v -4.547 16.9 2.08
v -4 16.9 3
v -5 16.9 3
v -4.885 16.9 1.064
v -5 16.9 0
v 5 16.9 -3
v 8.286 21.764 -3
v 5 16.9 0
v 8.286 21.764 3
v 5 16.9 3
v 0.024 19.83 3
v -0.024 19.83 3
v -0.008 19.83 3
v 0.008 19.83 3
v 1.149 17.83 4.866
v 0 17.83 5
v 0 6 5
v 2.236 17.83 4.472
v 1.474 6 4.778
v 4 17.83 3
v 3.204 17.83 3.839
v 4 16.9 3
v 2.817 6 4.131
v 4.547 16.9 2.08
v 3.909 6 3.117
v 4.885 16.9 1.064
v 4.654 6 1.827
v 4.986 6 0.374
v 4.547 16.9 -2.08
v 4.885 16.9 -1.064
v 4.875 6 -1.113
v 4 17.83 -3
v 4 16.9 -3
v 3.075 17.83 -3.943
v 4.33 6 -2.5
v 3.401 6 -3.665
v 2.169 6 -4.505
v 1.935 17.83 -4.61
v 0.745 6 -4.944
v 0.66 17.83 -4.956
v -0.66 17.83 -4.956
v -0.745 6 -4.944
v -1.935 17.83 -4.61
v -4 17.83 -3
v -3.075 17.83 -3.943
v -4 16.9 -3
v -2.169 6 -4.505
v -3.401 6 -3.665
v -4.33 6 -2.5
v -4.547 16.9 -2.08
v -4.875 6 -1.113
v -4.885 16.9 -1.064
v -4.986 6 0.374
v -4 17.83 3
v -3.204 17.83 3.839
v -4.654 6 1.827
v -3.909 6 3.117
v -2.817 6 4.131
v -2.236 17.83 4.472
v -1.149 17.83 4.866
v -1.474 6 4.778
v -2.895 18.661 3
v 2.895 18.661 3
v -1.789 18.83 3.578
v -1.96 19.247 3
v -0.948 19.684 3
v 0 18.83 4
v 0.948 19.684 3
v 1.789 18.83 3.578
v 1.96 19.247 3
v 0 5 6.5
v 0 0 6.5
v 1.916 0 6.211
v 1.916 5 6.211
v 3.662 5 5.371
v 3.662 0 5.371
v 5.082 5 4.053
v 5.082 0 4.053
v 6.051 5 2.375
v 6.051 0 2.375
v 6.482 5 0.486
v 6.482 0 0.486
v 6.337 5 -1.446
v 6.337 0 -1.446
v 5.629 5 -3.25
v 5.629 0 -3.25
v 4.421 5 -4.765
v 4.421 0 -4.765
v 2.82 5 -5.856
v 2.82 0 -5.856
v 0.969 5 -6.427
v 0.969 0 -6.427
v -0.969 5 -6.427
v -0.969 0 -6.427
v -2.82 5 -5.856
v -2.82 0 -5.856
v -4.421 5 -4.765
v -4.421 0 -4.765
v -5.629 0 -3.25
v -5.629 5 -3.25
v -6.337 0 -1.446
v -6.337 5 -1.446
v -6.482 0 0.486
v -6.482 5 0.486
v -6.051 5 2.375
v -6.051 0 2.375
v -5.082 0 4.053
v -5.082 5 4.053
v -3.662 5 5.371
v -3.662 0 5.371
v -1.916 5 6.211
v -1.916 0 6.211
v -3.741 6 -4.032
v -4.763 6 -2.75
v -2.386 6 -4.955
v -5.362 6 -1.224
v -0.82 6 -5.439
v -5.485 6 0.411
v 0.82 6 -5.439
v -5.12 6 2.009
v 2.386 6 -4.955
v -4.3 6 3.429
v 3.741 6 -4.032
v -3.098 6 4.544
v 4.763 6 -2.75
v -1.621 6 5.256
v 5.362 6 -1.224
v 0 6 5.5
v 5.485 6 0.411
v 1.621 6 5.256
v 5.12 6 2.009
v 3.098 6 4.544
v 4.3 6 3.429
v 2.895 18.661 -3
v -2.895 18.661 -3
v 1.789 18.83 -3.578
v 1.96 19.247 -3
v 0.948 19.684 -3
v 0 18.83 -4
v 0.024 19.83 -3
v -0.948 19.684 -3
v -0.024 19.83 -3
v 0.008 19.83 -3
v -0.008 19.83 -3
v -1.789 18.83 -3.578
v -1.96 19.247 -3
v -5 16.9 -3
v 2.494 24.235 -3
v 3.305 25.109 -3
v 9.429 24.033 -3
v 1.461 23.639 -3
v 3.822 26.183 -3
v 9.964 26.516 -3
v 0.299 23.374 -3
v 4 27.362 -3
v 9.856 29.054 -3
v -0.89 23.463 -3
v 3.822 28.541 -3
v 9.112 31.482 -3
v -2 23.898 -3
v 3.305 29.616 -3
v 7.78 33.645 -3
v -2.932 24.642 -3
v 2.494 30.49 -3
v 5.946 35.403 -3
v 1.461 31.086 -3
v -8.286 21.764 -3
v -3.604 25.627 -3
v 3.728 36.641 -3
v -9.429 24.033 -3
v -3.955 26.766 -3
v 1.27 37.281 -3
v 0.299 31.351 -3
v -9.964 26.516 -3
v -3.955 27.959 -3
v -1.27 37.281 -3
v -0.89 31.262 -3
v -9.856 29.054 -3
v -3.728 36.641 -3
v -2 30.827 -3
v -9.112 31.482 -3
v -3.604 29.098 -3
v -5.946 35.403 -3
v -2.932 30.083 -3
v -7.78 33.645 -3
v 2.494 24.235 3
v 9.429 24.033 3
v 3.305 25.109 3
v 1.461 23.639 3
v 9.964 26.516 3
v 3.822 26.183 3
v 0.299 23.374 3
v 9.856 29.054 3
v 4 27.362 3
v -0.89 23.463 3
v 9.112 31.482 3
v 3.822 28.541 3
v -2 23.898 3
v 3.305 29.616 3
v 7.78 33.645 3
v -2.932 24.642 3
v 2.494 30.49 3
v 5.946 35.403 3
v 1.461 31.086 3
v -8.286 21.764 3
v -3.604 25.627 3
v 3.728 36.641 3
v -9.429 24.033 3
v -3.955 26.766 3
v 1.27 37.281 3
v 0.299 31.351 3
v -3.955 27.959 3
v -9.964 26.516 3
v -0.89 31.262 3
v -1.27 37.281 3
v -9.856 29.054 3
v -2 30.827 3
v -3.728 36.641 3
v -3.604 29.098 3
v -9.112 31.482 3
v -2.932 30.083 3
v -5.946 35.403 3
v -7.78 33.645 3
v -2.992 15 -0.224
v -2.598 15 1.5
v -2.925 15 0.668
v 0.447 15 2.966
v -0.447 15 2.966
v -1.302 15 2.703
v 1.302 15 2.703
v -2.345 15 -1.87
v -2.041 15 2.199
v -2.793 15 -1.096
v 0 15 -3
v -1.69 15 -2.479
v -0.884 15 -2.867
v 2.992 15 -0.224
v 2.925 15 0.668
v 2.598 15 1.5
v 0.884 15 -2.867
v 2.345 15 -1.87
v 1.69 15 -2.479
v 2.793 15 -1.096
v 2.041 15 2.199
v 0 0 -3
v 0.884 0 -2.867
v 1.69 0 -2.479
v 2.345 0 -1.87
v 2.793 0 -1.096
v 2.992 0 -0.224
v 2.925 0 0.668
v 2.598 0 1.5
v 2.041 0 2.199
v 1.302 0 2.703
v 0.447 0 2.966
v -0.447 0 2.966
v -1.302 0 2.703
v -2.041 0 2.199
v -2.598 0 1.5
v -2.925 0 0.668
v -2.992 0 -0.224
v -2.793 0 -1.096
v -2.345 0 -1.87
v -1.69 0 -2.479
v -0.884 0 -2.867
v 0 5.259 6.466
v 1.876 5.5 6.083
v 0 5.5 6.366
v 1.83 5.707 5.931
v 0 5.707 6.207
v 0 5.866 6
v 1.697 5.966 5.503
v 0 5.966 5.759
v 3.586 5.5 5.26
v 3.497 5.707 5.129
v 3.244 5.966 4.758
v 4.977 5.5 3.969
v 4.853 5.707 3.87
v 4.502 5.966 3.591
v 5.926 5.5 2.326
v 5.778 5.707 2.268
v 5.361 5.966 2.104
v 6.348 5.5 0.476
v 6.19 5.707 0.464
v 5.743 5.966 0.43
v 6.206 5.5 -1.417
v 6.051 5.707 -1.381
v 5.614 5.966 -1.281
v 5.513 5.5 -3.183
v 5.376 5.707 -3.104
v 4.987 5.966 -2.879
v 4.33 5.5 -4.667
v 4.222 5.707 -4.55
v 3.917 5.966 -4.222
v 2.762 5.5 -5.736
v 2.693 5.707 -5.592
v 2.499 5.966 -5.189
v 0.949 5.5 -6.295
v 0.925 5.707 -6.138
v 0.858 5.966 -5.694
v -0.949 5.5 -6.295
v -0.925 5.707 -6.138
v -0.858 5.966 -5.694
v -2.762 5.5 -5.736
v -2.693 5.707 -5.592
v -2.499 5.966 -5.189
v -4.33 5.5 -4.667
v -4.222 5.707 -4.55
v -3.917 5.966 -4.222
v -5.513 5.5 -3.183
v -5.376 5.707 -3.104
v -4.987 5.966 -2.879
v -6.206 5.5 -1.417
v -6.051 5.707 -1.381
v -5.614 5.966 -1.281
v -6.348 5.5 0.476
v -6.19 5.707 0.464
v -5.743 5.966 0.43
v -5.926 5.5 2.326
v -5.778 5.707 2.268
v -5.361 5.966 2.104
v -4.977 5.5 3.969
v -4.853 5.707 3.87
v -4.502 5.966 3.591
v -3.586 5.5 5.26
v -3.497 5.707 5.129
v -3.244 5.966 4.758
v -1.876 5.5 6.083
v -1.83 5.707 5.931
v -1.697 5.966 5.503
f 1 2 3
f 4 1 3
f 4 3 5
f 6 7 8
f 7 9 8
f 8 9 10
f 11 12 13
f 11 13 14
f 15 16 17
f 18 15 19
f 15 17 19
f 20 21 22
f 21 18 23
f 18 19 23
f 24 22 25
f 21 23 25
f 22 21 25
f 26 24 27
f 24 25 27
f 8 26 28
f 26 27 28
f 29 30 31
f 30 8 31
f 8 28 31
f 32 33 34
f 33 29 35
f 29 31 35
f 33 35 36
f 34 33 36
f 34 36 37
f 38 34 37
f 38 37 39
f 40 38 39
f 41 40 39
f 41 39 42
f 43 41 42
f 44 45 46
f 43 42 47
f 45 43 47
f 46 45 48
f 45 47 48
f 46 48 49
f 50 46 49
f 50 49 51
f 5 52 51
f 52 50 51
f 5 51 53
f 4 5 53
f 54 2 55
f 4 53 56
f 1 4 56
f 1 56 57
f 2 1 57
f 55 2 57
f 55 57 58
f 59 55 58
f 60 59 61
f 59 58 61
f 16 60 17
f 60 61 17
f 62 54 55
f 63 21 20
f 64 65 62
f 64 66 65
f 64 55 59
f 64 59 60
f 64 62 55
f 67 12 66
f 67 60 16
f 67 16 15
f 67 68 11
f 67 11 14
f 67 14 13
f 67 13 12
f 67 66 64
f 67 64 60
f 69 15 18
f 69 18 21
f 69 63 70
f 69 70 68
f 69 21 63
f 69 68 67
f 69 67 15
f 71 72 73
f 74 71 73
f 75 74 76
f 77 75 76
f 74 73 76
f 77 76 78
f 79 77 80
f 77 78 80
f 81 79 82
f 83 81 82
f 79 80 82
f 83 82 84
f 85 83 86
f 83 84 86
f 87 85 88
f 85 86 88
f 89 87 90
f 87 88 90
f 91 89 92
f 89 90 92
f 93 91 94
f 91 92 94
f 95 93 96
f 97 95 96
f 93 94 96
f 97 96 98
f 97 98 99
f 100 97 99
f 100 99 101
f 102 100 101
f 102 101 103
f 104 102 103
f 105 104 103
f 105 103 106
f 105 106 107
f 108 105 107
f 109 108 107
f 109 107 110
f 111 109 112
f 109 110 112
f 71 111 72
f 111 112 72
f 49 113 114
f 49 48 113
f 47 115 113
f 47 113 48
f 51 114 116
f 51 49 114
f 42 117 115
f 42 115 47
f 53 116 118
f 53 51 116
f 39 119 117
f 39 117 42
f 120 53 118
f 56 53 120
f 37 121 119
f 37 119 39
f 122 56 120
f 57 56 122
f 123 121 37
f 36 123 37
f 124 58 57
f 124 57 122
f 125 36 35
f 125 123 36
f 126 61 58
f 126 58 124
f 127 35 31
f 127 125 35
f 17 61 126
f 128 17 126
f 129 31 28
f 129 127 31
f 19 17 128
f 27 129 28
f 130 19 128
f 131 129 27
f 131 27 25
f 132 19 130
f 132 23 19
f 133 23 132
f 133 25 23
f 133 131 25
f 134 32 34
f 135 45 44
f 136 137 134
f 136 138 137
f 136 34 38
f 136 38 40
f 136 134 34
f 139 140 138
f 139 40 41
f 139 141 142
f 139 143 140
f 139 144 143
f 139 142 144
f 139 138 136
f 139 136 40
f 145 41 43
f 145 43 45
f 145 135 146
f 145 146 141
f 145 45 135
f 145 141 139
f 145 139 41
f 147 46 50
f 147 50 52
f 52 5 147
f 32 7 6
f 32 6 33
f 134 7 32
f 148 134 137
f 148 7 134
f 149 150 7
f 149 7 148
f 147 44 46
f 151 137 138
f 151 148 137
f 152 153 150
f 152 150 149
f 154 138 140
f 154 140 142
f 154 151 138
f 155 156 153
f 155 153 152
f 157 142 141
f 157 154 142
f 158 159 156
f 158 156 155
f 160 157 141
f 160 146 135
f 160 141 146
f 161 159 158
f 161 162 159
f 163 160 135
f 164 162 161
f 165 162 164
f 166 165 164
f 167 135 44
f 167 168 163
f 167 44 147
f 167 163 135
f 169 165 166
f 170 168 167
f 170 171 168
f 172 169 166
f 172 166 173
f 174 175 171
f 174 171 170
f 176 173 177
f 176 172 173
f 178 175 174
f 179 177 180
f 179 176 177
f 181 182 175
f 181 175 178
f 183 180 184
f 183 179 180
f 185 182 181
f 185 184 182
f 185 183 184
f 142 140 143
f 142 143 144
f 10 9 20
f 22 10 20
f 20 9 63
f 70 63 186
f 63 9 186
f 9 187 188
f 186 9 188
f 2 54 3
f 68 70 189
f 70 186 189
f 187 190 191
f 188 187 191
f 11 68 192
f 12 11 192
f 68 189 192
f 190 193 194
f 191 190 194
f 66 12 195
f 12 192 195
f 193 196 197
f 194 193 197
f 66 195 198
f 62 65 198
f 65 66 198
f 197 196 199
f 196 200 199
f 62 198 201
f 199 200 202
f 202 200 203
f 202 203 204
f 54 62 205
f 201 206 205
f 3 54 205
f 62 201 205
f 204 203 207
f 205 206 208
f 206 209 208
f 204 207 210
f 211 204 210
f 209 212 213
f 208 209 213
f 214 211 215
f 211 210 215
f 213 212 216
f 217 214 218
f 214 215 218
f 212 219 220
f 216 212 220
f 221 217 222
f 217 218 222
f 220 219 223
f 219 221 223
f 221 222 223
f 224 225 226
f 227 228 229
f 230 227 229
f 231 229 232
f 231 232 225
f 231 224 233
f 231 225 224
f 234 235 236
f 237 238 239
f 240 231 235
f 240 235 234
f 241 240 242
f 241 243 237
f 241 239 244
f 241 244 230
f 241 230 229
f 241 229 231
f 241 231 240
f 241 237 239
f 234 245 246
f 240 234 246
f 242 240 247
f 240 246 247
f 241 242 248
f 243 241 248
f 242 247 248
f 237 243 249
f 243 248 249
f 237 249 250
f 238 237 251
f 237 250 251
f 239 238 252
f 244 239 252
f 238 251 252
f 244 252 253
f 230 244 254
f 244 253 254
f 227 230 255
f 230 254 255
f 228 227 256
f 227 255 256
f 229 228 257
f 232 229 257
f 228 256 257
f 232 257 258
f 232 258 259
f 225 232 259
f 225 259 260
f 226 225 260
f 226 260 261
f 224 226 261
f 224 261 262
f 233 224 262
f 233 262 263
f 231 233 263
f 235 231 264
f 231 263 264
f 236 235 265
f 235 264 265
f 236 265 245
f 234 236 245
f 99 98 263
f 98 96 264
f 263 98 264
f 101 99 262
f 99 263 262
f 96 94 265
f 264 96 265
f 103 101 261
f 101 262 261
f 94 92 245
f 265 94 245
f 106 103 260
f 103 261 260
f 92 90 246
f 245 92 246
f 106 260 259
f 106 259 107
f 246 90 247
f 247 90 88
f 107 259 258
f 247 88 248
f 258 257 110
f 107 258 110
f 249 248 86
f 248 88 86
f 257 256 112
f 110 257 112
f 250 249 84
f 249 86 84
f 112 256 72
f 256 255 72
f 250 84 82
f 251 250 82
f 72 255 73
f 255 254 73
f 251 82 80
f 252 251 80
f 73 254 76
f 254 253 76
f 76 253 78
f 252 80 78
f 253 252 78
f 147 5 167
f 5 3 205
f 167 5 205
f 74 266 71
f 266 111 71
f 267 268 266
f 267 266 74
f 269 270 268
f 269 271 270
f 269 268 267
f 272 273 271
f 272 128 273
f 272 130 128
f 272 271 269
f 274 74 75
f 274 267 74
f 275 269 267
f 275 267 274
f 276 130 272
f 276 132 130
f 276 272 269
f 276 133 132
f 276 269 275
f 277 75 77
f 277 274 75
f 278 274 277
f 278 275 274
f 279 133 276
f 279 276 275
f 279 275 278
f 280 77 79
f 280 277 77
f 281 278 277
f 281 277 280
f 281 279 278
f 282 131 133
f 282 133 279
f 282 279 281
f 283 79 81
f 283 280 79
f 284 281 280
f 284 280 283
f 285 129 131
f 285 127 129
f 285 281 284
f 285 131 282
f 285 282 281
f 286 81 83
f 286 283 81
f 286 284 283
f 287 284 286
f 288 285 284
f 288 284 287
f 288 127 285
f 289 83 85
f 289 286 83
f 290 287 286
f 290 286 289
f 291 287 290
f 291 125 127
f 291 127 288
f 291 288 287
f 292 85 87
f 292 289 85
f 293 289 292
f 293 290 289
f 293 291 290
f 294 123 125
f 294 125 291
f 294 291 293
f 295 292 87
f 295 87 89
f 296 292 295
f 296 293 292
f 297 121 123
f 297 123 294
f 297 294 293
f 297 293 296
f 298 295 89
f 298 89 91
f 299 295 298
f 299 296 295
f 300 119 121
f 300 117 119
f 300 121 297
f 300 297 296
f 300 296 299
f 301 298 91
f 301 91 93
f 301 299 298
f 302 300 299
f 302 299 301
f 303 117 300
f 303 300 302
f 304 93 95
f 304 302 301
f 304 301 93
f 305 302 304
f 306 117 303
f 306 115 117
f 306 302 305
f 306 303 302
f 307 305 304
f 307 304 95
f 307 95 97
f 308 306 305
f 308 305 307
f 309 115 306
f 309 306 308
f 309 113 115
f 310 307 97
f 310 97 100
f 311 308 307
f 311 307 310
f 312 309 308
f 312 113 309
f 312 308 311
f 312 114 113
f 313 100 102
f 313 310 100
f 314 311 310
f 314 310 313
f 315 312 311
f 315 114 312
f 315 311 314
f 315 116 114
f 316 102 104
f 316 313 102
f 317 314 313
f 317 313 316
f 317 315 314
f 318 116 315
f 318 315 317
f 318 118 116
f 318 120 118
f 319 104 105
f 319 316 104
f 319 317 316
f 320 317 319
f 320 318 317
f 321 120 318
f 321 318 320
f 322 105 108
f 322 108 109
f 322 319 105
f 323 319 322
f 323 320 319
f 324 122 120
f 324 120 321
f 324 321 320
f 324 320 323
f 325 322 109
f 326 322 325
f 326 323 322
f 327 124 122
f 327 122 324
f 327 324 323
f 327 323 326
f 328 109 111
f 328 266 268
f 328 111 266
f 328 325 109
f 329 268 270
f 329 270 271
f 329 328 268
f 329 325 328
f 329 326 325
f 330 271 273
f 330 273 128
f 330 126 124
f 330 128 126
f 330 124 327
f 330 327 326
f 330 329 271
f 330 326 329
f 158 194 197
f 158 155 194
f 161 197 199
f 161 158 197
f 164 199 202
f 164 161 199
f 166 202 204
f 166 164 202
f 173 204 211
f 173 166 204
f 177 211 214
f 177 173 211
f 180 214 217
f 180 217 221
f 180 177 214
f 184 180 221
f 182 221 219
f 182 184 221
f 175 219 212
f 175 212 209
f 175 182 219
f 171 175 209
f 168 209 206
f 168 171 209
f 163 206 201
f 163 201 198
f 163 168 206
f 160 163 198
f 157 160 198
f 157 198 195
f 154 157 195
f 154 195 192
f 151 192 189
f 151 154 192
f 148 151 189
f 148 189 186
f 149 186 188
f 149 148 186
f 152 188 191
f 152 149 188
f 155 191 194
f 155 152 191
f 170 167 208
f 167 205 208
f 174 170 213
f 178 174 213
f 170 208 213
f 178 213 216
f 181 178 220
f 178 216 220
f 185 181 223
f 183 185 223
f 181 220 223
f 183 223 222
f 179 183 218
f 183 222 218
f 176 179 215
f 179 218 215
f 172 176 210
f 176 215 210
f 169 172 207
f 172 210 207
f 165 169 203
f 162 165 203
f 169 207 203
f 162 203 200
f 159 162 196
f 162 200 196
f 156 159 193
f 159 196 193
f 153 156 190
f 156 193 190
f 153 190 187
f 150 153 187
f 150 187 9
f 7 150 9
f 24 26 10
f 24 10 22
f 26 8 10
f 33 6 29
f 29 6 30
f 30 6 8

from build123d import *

# Parameters (mm, degrees)
SKETCH1_R           = 6.5
BOSS_EXTRUDE1_DEPTH = 6
FILLET1_R           = 1
SKETCH3_R           = 5
BOSS_EXTRUDE2_DEPTH = 13.83
SKETCH2_R           = 3
CUT_EXTRUDE1_DEPTH  = 15
SKETCH4_R           = 4
BOSS_EXTRUDE4_DEPTH = 3
CHAMFER2_SIZE       = 2


with BuildPart() as part:
    # Sketch1 → Boss-Extrude1 (new body)
    with BuildSketch(Plane(origin=(0, 0, 0), x_dir=(1, 0, 0), z_dir=(0, 1, 0))):
        with Locations(Location((0, 0, 0), (0, 0, 270))):
            Circle(SKETCH1_R)
    extrude(amount=BOSS_EXTRUDE1_DEPTH)

    # Fillet1
    fillet1_edges = [part.edges().sort_by_distance(p)[0] for p in [
        (0, 6, -6.5),
    ]]
    fillet(fillet1_edges, radius=FILLET1_R)

    # Sketch3 → Boss-Extrude2 (add)
    with BuildSketch(Plane(origin=(0, 6, 0), x_dir=(1, 0, 0), z_dir=(0, 1, 0))):
        with Locations(Location((0, 0, 0), (0, 0, 270))):
            Circle(SKETCH3_R)
    extrude(amount=BOSS_EXTRUDE2_DEPTH)

    # Sketch2 → Cut-Extrude1 (cut)
    with BuildSketch(Plane.XZ):
        with Locations(Location((0, 0, 0), (0, 0, 270))):
            Circle(SKETCH2_R)
    extrude(amount=-CUT_EXTRUDE1_DEPTH, mode=Mode.SUBTRACT)

    # Sketch4 → Boss-Extrude4 (add, symmetric)
    with BuildSketch(Plane.XY):
        with BuildLine():
            Line((-5, 16.9), (-8.286276315, 21.764413101))
            ThreePointArc((-8.286276315, 21.764413101), (0, 37.362414962), (8.286276315, 21.764413101))
            Line((8.286276315, 21.764413101), (5, 16.9))
            Line((5, 16.9), (-5, 16.9))
        make_face()
        with Locations((0, 27.362414962)):
            Circle(SKETCH4_R, mode=Mode.SUBTRACT)
    extrude(amount=BOSS_EXTRUDE4_DEPTH, both=True)

    # Chamfer2
    chamfer2_edges = [part.edges().sort_by_distance(p)[0] for p in [
        (0, 19.83, -5),
        (2.236067977, 19.83, 4.472135955),
    ]]
    chamfer(chamfer2_edges, length=CHAMFER2_SIZE - 0.0001)  # a hair under: the kernel refuses the full size


solid = part.part
